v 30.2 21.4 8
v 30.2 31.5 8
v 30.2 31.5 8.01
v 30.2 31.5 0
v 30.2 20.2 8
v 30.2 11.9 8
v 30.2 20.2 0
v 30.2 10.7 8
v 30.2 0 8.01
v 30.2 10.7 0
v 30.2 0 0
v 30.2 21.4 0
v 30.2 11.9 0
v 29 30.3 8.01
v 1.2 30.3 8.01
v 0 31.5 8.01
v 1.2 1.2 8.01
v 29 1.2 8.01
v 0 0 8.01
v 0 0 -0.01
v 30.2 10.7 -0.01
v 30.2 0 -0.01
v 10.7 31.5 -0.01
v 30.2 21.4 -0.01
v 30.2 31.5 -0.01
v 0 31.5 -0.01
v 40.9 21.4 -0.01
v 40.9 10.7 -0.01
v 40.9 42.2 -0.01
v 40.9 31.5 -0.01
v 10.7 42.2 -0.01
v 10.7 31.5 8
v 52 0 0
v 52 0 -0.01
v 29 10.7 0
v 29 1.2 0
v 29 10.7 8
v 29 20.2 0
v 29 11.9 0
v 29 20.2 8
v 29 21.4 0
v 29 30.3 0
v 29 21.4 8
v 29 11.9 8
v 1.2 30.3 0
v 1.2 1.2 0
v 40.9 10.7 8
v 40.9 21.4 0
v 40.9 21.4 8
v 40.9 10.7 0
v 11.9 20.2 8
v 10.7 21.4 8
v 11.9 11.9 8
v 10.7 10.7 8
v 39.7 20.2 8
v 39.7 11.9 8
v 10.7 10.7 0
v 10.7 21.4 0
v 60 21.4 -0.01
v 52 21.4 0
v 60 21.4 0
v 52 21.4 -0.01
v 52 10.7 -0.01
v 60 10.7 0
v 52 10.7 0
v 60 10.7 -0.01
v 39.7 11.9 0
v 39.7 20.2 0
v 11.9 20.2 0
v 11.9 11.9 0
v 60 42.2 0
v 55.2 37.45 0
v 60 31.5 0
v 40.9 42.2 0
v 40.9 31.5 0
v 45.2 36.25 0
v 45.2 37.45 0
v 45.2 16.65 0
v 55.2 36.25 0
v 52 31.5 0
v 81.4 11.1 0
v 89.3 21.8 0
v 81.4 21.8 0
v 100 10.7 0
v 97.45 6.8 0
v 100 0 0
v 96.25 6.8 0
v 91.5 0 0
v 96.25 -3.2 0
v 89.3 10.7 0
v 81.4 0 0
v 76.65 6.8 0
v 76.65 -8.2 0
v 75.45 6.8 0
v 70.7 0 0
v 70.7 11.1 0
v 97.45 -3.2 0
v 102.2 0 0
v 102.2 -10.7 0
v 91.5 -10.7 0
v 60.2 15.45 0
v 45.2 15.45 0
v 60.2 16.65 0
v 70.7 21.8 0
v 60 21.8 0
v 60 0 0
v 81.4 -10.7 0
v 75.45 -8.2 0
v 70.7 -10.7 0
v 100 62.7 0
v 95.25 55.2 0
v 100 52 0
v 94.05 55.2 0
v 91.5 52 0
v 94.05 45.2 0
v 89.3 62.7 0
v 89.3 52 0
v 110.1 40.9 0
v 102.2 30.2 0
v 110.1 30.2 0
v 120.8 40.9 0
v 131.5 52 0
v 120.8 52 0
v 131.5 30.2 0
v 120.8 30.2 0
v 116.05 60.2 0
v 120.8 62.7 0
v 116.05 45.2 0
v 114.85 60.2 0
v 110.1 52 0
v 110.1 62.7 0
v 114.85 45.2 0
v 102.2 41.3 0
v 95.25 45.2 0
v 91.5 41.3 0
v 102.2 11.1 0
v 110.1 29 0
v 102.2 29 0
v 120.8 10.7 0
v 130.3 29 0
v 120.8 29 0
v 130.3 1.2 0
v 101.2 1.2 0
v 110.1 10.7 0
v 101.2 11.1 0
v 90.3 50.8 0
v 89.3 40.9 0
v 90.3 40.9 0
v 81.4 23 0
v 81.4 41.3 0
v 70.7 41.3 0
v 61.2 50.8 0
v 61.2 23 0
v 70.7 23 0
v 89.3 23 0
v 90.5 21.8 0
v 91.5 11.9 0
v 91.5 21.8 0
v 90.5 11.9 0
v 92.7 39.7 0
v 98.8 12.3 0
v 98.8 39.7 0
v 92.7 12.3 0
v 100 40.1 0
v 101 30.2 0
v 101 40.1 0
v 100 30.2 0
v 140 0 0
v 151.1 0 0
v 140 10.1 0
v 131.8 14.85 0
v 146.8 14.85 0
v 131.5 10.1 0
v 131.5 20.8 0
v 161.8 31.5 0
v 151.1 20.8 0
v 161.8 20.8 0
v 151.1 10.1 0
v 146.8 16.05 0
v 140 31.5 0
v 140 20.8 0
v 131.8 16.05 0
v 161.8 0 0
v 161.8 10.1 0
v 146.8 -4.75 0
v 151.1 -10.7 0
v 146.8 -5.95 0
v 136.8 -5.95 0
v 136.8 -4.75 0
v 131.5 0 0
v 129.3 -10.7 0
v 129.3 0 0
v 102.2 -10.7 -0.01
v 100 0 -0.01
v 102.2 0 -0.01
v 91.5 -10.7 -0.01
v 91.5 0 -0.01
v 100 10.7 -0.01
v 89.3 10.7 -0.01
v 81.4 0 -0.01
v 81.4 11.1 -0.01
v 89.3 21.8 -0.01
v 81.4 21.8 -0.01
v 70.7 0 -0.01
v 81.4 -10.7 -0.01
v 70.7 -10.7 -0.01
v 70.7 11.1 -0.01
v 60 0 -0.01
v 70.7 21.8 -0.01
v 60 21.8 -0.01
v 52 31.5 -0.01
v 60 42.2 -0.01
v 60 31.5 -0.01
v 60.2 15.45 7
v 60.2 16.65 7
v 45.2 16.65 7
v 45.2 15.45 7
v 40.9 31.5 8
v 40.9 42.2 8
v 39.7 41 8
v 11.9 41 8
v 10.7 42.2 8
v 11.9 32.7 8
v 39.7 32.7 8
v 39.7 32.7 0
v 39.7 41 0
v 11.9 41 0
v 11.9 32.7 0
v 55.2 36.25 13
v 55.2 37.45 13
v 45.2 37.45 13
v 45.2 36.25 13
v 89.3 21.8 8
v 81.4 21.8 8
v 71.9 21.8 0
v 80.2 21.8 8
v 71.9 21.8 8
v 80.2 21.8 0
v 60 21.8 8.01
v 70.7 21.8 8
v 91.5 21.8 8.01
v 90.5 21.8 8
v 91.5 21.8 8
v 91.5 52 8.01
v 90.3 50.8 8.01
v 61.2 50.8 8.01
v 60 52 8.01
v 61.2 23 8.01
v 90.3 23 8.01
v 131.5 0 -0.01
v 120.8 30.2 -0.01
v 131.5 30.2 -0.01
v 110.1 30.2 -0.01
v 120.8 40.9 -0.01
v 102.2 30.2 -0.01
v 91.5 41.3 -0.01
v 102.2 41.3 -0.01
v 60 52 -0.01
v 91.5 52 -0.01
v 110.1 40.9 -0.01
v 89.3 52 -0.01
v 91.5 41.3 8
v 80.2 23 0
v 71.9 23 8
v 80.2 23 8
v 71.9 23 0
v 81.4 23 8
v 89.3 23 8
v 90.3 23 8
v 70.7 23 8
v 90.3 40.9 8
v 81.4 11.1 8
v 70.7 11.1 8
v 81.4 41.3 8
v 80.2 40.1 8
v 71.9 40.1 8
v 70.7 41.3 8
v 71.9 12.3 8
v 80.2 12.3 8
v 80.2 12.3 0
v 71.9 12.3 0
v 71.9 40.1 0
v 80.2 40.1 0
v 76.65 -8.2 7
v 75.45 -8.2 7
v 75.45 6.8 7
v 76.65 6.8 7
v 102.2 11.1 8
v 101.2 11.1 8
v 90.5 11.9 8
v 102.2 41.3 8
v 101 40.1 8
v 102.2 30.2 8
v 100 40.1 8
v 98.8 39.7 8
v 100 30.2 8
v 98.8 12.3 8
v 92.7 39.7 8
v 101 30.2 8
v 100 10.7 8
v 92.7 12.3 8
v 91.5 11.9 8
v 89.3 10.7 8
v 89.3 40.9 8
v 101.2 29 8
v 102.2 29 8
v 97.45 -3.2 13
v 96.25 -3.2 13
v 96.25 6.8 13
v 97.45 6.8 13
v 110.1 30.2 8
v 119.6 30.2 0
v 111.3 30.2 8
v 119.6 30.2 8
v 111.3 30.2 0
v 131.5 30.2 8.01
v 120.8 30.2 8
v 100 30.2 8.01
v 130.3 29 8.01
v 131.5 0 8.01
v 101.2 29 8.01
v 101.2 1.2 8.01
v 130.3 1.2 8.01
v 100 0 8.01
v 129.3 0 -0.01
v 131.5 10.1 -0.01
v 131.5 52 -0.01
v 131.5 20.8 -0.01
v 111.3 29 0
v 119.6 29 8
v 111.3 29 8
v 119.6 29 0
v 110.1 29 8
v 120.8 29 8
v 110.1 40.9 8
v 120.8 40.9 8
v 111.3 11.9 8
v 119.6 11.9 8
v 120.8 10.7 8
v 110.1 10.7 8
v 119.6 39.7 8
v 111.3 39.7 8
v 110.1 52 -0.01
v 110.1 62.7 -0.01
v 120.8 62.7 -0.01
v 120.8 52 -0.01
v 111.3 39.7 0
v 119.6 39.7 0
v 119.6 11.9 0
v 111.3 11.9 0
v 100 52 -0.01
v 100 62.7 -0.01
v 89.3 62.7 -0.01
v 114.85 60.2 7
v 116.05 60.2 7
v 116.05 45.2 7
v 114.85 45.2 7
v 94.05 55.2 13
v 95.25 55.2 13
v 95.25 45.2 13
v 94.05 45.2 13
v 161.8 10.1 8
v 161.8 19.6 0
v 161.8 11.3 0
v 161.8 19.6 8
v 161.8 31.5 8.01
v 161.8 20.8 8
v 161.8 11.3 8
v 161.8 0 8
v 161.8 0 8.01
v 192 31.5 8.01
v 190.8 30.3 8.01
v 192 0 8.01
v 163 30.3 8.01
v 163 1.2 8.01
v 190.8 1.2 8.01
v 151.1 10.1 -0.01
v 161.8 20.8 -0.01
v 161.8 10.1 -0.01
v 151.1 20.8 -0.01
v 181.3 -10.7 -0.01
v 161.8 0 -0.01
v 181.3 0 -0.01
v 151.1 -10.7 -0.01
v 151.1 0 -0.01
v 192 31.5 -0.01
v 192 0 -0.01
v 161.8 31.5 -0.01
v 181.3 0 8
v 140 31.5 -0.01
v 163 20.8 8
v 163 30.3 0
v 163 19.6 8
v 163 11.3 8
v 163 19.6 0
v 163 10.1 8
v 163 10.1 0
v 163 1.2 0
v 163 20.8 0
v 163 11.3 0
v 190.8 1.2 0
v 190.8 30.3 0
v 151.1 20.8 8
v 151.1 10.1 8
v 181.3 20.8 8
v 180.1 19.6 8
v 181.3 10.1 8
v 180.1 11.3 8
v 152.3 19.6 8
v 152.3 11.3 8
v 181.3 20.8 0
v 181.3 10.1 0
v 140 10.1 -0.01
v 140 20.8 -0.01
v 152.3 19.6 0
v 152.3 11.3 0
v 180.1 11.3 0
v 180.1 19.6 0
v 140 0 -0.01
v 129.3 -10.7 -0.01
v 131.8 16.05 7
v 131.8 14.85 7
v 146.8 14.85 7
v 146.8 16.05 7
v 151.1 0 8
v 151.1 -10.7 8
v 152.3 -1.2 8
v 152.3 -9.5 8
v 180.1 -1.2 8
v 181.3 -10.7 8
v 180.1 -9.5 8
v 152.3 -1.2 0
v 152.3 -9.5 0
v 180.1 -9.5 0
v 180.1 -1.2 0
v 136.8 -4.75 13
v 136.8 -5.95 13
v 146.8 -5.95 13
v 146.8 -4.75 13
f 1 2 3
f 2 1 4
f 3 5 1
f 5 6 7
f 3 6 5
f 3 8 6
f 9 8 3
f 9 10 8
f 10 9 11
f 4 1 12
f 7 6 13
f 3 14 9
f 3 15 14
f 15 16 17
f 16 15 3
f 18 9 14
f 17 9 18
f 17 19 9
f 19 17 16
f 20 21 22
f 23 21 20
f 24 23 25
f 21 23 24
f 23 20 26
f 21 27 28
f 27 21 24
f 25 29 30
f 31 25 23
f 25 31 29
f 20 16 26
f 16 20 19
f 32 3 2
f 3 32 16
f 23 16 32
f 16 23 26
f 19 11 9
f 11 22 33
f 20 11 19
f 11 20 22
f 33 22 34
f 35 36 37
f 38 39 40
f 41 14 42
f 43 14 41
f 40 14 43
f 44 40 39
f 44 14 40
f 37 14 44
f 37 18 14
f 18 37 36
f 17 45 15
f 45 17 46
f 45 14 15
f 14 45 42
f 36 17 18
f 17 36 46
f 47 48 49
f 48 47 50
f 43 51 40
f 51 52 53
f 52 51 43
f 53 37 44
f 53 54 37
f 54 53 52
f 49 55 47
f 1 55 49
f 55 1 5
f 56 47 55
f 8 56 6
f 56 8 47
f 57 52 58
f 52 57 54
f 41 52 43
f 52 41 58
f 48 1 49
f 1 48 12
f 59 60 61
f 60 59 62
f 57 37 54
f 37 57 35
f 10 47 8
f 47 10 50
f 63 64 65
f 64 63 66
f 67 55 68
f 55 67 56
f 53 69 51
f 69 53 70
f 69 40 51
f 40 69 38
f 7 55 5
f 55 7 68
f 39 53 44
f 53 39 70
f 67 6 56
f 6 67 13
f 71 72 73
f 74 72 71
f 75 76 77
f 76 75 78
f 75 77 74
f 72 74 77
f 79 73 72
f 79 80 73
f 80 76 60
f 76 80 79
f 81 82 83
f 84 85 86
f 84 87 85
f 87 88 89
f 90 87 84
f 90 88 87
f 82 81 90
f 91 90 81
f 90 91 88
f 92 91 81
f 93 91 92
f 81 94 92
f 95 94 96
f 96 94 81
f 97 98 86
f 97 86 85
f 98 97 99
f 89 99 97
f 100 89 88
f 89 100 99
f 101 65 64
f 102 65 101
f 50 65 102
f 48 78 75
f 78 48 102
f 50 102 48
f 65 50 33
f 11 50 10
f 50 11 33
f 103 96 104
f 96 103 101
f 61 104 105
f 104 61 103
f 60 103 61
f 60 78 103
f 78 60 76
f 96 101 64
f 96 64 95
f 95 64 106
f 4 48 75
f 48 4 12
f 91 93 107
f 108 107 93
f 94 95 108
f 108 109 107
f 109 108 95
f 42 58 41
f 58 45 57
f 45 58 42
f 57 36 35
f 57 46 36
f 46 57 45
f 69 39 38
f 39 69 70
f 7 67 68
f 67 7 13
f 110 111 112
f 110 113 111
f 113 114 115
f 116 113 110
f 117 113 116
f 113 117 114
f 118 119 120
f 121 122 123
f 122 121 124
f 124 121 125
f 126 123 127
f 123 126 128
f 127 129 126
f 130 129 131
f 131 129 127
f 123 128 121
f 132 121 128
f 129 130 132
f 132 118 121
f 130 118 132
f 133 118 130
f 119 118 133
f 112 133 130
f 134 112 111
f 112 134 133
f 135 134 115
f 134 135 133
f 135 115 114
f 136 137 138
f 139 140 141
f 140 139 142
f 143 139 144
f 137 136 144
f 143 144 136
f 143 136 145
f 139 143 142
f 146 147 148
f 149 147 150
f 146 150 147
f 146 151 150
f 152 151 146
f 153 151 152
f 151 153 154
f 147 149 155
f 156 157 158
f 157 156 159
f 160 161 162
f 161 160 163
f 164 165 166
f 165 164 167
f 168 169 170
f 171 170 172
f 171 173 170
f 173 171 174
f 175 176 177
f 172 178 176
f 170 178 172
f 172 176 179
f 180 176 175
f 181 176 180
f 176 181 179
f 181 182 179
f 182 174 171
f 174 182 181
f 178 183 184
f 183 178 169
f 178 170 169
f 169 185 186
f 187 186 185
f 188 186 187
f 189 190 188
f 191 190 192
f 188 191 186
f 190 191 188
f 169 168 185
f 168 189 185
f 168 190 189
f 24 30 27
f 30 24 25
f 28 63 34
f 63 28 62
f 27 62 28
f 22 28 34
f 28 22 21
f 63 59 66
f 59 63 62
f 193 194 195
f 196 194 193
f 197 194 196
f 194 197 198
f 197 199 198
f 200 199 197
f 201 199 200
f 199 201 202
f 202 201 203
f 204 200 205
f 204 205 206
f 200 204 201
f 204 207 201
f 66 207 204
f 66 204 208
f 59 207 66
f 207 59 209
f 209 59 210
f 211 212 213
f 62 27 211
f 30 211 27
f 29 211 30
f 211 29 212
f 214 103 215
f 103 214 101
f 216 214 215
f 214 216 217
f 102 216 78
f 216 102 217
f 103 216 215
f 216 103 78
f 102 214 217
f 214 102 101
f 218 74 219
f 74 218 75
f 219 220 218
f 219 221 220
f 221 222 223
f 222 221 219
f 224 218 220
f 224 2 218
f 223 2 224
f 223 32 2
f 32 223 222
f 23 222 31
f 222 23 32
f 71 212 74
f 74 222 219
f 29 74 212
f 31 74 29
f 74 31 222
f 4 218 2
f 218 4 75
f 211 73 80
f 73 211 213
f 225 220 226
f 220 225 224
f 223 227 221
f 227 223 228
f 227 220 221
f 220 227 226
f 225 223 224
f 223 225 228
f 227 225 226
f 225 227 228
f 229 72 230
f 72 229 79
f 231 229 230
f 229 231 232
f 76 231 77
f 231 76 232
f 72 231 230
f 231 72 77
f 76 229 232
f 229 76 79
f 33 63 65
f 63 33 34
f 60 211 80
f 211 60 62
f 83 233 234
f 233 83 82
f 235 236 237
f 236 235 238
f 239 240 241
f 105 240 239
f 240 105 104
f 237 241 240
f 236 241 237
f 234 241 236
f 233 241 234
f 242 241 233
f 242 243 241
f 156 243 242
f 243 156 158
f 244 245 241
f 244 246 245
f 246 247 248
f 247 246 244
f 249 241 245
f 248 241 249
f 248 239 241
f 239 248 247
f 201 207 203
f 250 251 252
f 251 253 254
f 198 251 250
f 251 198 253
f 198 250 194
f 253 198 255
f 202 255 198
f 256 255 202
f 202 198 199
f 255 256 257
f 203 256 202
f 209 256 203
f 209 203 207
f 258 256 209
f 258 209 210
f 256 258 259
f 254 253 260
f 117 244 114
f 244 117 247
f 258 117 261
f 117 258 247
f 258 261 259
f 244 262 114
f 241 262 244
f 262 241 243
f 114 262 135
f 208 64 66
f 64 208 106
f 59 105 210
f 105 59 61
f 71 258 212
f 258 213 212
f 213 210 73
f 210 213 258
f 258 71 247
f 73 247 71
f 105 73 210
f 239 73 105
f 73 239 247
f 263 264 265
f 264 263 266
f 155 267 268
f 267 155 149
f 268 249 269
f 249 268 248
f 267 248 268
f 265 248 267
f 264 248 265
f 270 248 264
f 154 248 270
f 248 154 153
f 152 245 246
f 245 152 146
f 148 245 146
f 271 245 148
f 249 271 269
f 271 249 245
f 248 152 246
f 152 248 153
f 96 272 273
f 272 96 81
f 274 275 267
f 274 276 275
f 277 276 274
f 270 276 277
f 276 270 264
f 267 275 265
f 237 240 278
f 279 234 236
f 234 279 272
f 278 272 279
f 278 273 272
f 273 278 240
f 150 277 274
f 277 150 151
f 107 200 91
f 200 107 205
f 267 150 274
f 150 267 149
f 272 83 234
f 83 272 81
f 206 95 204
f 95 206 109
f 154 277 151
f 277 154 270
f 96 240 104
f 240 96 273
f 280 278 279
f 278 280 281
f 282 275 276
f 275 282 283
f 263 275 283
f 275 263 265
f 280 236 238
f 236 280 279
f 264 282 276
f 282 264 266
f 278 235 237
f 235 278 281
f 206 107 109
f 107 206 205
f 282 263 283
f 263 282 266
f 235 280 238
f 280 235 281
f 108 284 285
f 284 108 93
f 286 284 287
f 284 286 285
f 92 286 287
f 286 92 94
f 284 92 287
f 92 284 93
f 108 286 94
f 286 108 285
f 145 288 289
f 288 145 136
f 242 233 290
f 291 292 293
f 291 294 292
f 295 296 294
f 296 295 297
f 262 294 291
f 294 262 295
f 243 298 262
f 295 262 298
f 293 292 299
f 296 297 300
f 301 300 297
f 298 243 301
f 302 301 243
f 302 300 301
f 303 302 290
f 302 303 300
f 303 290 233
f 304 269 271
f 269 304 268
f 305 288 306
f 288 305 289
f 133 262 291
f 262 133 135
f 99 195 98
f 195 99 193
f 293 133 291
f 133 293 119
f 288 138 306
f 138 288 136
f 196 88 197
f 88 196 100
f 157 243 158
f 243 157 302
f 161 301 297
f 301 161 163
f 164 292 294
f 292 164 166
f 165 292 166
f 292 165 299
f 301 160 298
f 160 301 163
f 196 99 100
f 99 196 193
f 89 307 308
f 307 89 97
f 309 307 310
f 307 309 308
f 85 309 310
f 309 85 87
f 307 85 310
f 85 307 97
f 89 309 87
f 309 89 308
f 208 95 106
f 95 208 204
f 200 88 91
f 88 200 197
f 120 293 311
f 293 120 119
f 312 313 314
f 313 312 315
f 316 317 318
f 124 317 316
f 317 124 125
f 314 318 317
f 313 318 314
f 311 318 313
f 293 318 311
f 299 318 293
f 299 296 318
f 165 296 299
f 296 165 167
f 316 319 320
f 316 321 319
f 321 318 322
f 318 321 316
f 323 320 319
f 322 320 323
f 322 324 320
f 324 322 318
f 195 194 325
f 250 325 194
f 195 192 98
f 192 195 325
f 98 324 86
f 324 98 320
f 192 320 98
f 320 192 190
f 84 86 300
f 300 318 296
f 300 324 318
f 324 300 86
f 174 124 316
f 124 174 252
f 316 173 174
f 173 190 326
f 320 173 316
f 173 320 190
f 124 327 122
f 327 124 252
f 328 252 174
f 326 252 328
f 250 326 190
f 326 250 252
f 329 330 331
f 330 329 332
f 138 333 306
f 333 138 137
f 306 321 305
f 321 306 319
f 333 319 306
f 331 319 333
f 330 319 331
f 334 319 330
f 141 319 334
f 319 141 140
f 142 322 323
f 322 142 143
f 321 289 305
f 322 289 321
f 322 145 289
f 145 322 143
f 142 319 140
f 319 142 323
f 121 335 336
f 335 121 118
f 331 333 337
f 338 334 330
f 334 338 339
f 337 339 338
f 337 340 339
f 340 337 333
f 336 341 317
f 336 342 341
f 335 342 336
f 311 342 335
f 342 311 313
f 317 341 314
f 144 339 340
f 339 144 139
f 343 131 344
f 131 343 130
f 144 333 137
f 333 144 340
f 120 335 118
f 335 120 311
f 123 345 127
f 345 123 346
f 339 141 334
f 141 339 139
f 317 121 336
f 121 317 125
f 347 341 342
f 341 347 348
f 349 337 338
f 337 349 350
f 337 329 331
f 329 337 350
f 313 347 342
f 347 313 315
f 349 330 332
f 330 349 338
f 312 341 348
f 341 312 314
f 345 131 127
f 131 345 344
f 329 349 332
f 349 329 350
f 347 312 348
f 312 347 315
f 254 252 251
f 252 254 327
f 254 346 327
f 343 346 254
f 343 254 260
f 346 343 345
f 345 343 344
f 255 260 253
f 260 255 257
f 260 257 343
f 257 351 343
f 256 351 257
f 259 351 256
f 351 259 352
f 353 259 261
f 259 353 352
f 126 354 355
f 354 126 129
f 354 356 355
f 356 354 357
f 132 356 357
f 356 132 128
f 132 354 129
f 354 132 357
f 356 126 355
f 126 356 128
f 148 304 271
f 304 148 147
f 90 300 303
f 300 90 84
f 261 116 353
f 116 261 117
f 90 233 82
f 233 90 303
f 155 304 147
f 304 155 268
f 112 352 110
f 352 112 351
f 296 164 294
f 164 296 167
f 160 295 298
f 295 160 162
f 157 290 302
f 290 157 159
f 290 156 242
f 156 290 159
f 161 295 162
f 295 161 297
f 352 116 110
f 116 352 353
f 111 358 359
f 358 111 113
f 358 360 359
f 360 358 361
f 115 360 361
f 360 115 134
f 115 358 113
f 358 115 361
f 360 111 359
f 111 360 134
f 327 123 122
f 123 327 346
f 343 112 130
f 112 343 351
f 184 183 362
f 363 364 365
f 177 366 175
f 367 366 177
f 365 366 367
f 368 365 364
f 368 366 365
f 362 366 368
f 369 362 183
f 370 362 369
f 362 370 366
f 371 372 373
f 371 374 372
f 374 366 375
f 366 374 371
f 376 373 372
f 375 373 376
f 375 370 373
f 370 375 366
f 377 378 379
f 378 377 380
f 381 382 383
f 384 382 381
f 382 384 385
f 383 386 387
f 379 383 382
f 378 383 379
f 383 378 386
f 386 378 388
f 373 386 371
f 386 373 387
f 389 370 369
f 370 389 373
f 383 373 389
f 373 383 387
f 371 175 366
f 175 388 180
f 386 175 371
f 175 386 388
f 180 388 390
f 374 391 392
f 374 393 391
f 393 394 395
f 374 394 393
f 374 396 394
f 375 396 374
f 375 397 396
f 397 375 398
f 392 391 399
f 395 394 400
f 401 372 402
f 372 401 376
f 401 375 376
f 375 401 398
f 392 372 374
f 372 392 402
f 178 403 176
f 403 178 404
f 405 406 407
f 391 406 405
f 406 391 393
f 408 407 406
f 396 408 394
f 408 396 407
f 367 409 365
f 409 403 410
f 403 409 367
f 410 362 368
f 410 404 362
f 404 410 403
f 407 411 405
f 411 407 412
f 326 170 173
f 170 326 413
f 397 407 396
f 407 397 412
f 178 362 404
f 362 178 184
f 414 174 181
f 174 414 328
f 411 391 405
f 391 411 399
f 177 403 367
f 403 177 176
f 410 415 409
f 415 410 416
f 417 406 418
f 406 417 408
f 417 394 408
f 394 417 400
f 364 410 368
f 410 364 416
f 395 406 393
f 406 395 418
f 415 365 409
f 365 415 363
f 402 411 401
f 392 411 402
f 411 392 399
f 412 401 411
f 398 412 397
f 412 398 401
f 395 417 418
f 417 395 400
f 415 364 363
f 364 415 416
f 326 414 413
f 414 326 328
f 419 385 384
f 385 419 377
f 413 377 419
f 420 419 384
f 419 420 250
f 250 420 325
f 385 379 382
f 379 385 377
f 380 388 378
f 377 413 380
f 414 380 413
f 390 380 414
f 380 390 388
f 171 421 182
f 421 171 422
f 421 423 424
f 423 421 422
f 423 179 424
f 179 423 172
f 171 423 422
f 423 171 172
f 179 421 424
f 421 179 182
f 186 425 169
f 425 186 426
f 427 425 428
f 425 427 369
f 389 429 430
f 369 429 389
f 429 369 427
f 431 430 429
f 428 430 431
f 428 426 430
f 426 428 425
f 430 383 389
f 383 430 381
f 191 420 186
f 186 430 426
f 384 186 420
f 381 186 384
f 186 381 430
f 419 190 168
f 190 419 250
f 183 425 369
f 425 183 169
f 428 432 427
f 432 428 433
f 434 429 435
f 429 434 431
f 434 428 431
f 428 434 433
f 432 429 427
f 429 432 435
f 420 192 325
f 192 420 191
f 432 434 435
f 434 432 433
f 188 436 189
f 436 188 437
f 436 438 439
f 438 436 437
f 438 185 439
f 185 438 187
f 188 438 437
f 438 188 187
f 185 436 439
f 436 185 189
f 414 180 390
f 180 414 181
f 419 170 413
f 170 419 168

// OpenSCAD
// file: ../../Elements/FrameBracketWithoutWorm.scad
// Fischertechnik Box Library
// Frame  for bracket without worm
// 31046

use <../Base/Constants.scad>
use <../ModelBase/Complex.scad>

// getFrameBracketWithoutWormSpace()
// Gets the space for a frame for a bracket with worm.

function getFrameBracketWithoutWormSpace() = getFrameBracketSpace();

// FrameBracketWithoutWorm()
// Frame for bracket with worm.

module FrameBracketWithoutWorm() {
    FrameBracket([ 10, getDividerThickness(), 13 ]);
}

// Test
color("lightgray")
FrameBracketWithoutWorm();
// file: ../../Elements/FrameBracketWithWorm.scad
// Fischertechnik Box Library
// Frame  for bracket with worm
// 31045

use <../Base/Constants.scad>
use <../ModelBase/Complex.scad>

// getFrameBracketWithWormSpace()
// Gets the space for a frame for a bracket with worm.

function getFrameBracketWithWormSpace() = getFrameBracketSpace();

// FrameBracketWithWorm()
// Frame for bracket with worm.

module FrameBracketWithWorm() {
    FrameBracket([ 15, getDividerThickness(), 7 ]);
}

// Test
color("lightgray")
FrameBracketWithWorm();
// file: ../../Base/Boxes.scad
// Fischertechnik Box Foundation
// Pre-designed Boxes

use <Constants.scad>

include <PlacementOptions.scad>

box190Width = 190;
box190Depth = 130;
box130Width = 130;
box130Depth = 95;
boxUsageHeight = 33.9;
boxWallThickness = 2.4;
boxBaseThickness = 1.0;
boxWebWidth = 3.0;

// getBoxWallThickness()
// Gets the wall thickness of a Fischertechnik Box

function getBoxWallThickness() = boxWallThickness;

// Gets the usable height of a fischertechnik box
function getBoxUsageHeight() = boxUsageHeight;

// Gets the thickness of the Fischertechnik box base.
function getBoxBaseThickness() = boxBaseThickness;

// Gets the width of a box web
function getBoxWebWidth() = boxWebWidth;

// Gets the usable inner space of a Box 190 as an x/y-list
function getBox190Space() = [
    box190Width - 2*getBoxWallThickness(), 
    box190Depth - 2*getBoxWallThickness() ];

// Imports the Fischertechnik empty box 130x190 mm and places it at position 0,0
// 190x130 are the outer sizes, the inner space is slightly smaller. Use getBox190Space() to get the inner sizes.
// This module needs the STL file "Fischertechnik Box 130x190.stl" in the library path.
// The box is positioned that the usable inner space is at the 0,0,0 position. The

module Box190() {
    translate([-getBoxWallThickness(),-getBoxWallThickness(),-getBoxBaseThickness()])
        import("Fischertechnik Box 130x190.stl", convexity=3);
}

// Gets the usable inner space of a Box 130 as an x/y-list
function getBox130Space() = [
    box130Width - 2*getBoxWallThickness(), 
    box130Depth - 2*getBoxWallThickness() ];

// Imports the Fischertechnik empty box 95x130 mm and places it at position 0,0
// 190x130 are the outer sizes, the inner space is slightly smaller. Use getBox190Space() to get the inner sizes.
// This module needs the STL file "Fischertechnik Box 95x130.stl" in the library path.
// The box is positioned that the usable inner space is at the 0,0,0 position. The

module Box130() {
    translate([-getBoxWallThickness(),-getBoxWallThickness(),-getBoxBaseThickness()])
        import("Fischertechnik Box 95x130.stl", convexity=3);
}

// Creates a web at the specified box walls
// corner 0 = LowerLeft, 1 = UpperLeft, 2 = UpperRight, 3 = LowerRight
// side 0 = LeftOfCorner, 1 = RightOfCorner
// distance = Distance in mm from the corner
// box = inner width and depth of the box (default: Box 190)
// webWidth = length of the web (default is 3 mms)
// webThickness = thickness of the web (default is 1 mm)

module BoxWeb(corner, side, distance, box=getBox190Space(), webWidth=getBoxWebWidth(), webThickness=1.0) {
    sink = getBoxWallThickness()/2;

    width = (corner % 2 == 0) ? 
            (side == LeftOfCorner ? webWidth : webThickness) :
            (side == LeftOfCorner ? webThickness : webWidth);

    depth = (corner % 2 == 0) ? 
            (side == RightOfCorner ? webWidth : webThickness) :
            (side == RightOfCorner ? webThickness : webWidth);
    
    xDiff = corner == LowerLeft ? 
                (side == LeftOfCorner ? -sink : distance) :
            (corner == UpperLeft ?                
                (side == LeftOfCorner ? distance : -sink) :
            (corner == UpperRight ?
                (side == LeftOfCorner ? box.x-webWidth+sink : box.x-distance-webThickness) :
                (side == LeftOfCorner ? box.x-distance-webThickness: box.x-webWidth+sink)));

    yDiff = corner == LowerLeft ? 
                (side == RightOfCorner ? -sink : distance) :
            (corner == UpperLeft ?
                (side == RightOfCorner ? box.y-distance : box.y-webWidth+sink) :
            (corner == UpperRight ?
                (side == RightOfCorner ? box.y-webWidth+sink : box.y-distance) :
                (side == RightOfCorner ? distance : -sink)));
    
    translate([xDiff, yDiff, -getExcess()])
        cube([width, depth, boxUsageHeight + 2*getExcess()]);
}
// file: ../../Base/Rotation.scad
// Fischertechnik Box Foundation
// Geometry Helpers Rotation

include <PlacementOptions.scad>

// getRotatedSpace(space, rotation=NoRotation)
// Rotates the space dependent on the specified rotation

function getRotatedSpace(space, rotation=NoRotation) = [
    (rotation == Rotate90 || rotation == Rotate270) ? space.y : space.x,
    (rotation == Rotate90 || rotation == Rotate270) ? space.x : space.y
];

// Rotates the given space around the fixed left lower corner
// space = the space the children needs as width/depth list [width,depth]
// rotation = 0 Rotate0 degrees, 1 Rotate90 degrees, 2 Rotate180 degrees, 3 Rotate270 degrees (equivalent to -90)

module RotateFix(space, rotation=NoRotation) {
    dy = (rotation == Rotate0 || rotation == Rotate270) ? 0 :
        (rotation == Rotate90) ? space.x :
        space.y;
    dx = (rotation < Rotate180) ? 0 :
        (rotation == Rotate180) ? space.x :
        space.y;
    
    translate([dx, dy, 0])
        rotate([0, 0, rotations[rotation]])
            children();
}
// file: ../../Base/Alignment.scad
// Fischertechnik Box Foundation
// Geometry Helpers Alignment

include <PlacementOptions.scad>

// getAlignedX(elementWidth, spaceWidth, align=AlignRight, offset=0)
// Gets the aligned X offset of an element with the given
// width in the given space.
// elementWidth = The width of the element to positon
// spaceWidth = The space where the element should be aligned
// align = 0 AlignLeft, 1 AlignCenter, 2 AlignRight
// offset = an optional offset from the aligned position. When
// aligned left or centered, then positive values are in X direction.
// When aligned right then positive values are in negative X direction.

function getAlignedX(elementWidth, spaceWidth, align=AlignRight, offset=0) =
    (align == AlignLeft) ?
        offset :
        ((align == AlignCenter) ?
        (spaceWidth - elementWidth)/2 + offset :
        spaceWidth - offset - elementWidth);

// getAlignedY(elementDepth, spaceDepth, align=AlignTop, offset=0)
// Gets the aligned Y offset of an element with the given
// depth in the given space.
// elementDepth = The depth of the element to positon
// spaceDepth = The space where the element should be aligned
// align = 0 AlignBottom, 1 AlignCenter, 2 AlignTop
// offset = an optional offset from the aligned position. When
// aligned bottom or centered, then positive values are in Y direction.
// When aligned top then positive values are in negative Y direction.

function getAlignedY(elementDepth, spaceDepth, align=AlignTop, offset=0) =
    (align == AlignBottom) ?
        offset :
        ((align == AlignCenter) ?
        (spaceDepth - elementDepth)/2 + offset :
        spaceDepth - offset - elementDepth);
// file: ../../Base/Constants.scad
// Fischertechnik Box Foundation
// Constants

// Constant values necessary for multiple elements

// Base constants
dividerThickness = 1.2;
excess = 0.01;
fragments = 90;
tolerance = 0.8;

// Gets the thickness of a divider 
function getDividerThickness() = dividerThickness;

// Gets the excess that is used to merge walls into each other
function getExcess() = excess;

// Gets amount of fragments of a cylinder
function getFragments() = fragments;

// Gets the inner tolerance of a frame to each side
function getTolerance() = tolerance;


// Fischertechnik specific constants
axisDiameter = 4;
axisBottomDiameter = axisDiameter + 1;
axisTolerance = 0.2;
axisLockingLength = 8;

// Gets axis diameter of Fischertechnik axis
function getAxisDiameter() = axisDiameter;

// Gets axis diameter tolerance (subtracted for element axis)
function getAxisTolerance() = axisTolerance;

// Gets the axis diameter for standing axis
function getStandAxisDiameter() = getAxisDiameter() - getAxisTolerance();

// Gets axis bottom diameter for thicker part at the bottom
function getAxisBottomDiameter() = axisBottomDiameter;

// Gets the lengthh of the locking part of a locking axis
function getAxisLockingLength() = axisLockingLength;

// Studs

studHeight = 2.5;
studTolerance = 0.2;
studRailDistance = 9;   // as in ft 50

// gets the height of a connecting stud
function getStudHeight() = studHeight;

// gets the connecting stud height tolerance
function getStudTolerance() = studTolerance;

// gets the default rail distance for studs
function getStudRailDistance() = studRailDistance;

// Dockable Frame with Edge

standardEdgeDistance = 2.5;
standardWebDistance = 11.5;
standardCornerLength = 15;

// gets the standard distance to the wall of the box for dockable frames with webs
function getStandardEdgeDistance() = standardEdgeDistance;

// gets the standard distance of each web to the corner of the dockable frame
function getStandardWebDistance() = standardWebDistance;

// gets the standard length of the corner walls of a dockable frame
function getStandardCornerLength() = standardCornerLength;

// Tubes

tubeWallFactor = 0.8;

// gets the wall thickness of a tube.
function getTubeWallThickness() = tubeWallFactor * getDividerThickness();

// Small Parts and Divider Frame

smallPartsFrameHeight = 20;

// gets the frame height for docked small parts boxes.
function getSmallPartsFrameHeight() = smallPartsFrameHeight;

// Hubs

hubRingDiameter = 19.5;
hubRingLevelDiameter = 21;

// gets the diameter of a tube matching the inner ring of a wheel
function getHubRingDiameter() = hubRingDiameter;

// gets the diameter of a hub tube with a thicker diameter
function getHubRingLevelDiameter() = hubRingLevelDiameter;

// Struts

strutAddLength = 9.0;
strutDepth = 8.0;
strutThickness = 2.8;
strutOuterTolerance = 0.6;

// gets the full length of a strut (nominal length plus 2x radius at the ends)
function getFullStrutLength(length) = length + strutAddLength;

// gets the radius of the end of a strut
function getStrutEndRadius() = strutAddLength / 2;

// gets the the depth (width) of a strut
function getStrutDepth() = strutDepth;

// gets the the thickness of a strut
function getStrutThickness() = strutThickness;

// gets the tolerance added to the strut sizes for strut holders
function getStrutOuterTolerance() = strutOuterTolerance;

// Propeller

propellerAxisDiameter = 7.0;
propellerAxisTolerance = 0.2;

// gets the propeller axis outer diameter
function getPropellerAxisDiameter() = propellerAxisDiameter;

// gets the propeller axis printing tolerance
function getPropellerAxisTolerance() = propellerAxisTolerance;
// file: ../../Base/PlacementOptions.scad
// Fischertechnik Box Foundation
// Placement Options

// Alignment
NoAlign = 0;
AlignLeft = 1;
AlignBottom = 2;
AlignCenter = 3;
AlignRight = 4;
AlignTop = 5;

// Element rotation degree steps
rotations = [0, -90, -180, -270];

// Rotation
NoRotation = 0;
Rotate0 = 0;
Rotate90 = 1;
Rotate180 = 2;
Rotate270 = 3;

// Docking (seen from above)
NoDock = -1;
DockLeft = 0;
DockTop = 1;
DockRight = 2;
DockCorner = 2;
DockBottom = 3;

// Web corners
LowerLeft = 0;
UpperLeft = 1;
UpperRight = 2;
LowerRight = 3;

// Web position relative to corner
LeftOfCorner = 0;
RightOfCorner = 1;
// file: ../../Elements/FrameBracketCombo.scad
// Fischertechnik Box Library
// Frames for brackets with and without worm
// 31045 + 31046

use <../Base/Constants.scad>
use <../Base/Deployment.scad>
use <../ModelBase/Simple.scad>
use <../ModelBase/Complex.scad>
use <FrameBracketWithWorm.scad>
use <FrameBracketWithoutWorm.scad>

include <../Base/PlacementOptions.scad>

outerDepth = 31.5;

// getFrameBracketComboSpace()
// Gets the space for a frame for a combination of brackets with worm and without worm.

function getFrameBracketComboSpace() = [getFrameBracketSpace().x, outerDepth];

// FrameBracketCombo()
// Frame for a combination of brackets with worm and without worm.

module FrameBracketCombo() {
    Space(getFrameBracketComboSpace());
    Frame([getFrameBracketWidth(), outerDepth - 2*getDividerThickness() - getTolerance(), getFrameBracketSpace().z]);
    DeployVertical(outerDepth, [getFrameBracketWithWormSpace(), getFrameBracketWithoutWormSpace()]) {
        FrameBracketWithWorm();
        FrameBracketWithoutWorm();
    }
}

// Test
color("lightgray")
FrameBracketCombo();
// file: ../../Base/Placement.scad
// Fischertechnik Box Foundation
// Geometry Helpers Placement

use <Constants.scad>
use <Alignment.scad>
use <Rotation.scad>
use <Boxes.scad>

include <PlacementOptions.scad>

// Place(x=0, y=0, elementSpace=[0,0], alignX=AlignLeft, alignY=AlignBottom, rotation=Rotate0, boxSpace=getBox190Space())
// Places the child at the specified position
// y = Y-Position. This is a relative position when an X aligment is specified.
// x = X-Position. This is a relative position when an Y aligment is specified.
// elementSpace = space of the element to be placed [x,y]
// alignX = -1=NoAlign, 0 AlignLeft, 1 AlignCenter, 3 AlignRight (elementSpace and boxSpace required!)
// alignY = -1=NoAlign, 2 AlignBottom, 1 AlignCenter, 4 AlignTop (elementSpace and boxSpace required!)
// rotation = 0 Rotate0 0 degrees, 1 Rotate90 90 degrees, 
// 2 Rotate180 180 degrees, 3 Rotate270 270 degrees (equivalent to -90)
// boxSpace = Inner space of the box where the placement occurs [x,y] - default is Box 190x130 inner space

module Place(x=0, y=0, elementSpace=[0,0], 
  alignX=AlignLeft, alignY=AlignBottom, 
  rotation=NoRotation, boxSpace=getBox190Space()) {

    module Position(x, y, space, rotation=Rotate0) {
        translate([x, y, 0])
            RotateFix(space, rotation)
                children();
    }

    space = getRotatedSpace(elementSpace, rotation);
    alignedX = getAlignedX(space.x, boxSpace.x, alignX, x);
    alignedY = getAlignedY(space.y, boxSpace.y, alignY, y);
    Position(alignedX, alignedY, elementSpace, rotation)
        children();
}

// Center(space=getBox130Space(), elementSpace=[0,0])
// space = Space where the children is centered. For cylinder use centered=true and no elementSpace.
// elementSpace = space of the element to be centered [x,y]

module Center(space=getBox190Space(), elementSpace=[0,0]) {
    translate([(space.x - elementSpace.x) / 2, (space.y - elementSpace.y) / 2])
        children(0);
}

// CenterHorizontal(width=0, y=0, offset=0, space=getBox130Space())
// space = Space where the children is centered. For cylinder use centered=true and no elementSpace.
// elementSpace = space of the element to be centered [x,y]

module CenterHorizontal(width=0, y=0, offset=0, space=getBox190Space()) {
    translate([(space.x - width) / 2 + offset, y])
        children(0);
}

// CenterVertical(depth=0, x=0, offset=0, space=getBox130Space())
// space = Space where the children is centered. For cylinder use centered=true and no elementSpace.
// elementSpace = space of the element to be centered [x,y]

module CenterVertical(depth=0, x=0, offset=0, space=getBox190Space()) {
    translate([x, (space.y - depth) / 2 + offset])
        children(0);
}
// main file
// Fischertechnik Box Foundation
// Elements
// Test FrameBracketCombo

use <../../Base/Placement.scad>
use <../../Elements/FrameBracketCombo.scad>

include <../../Base/PlacementOptions.scad>

FrameBracketCombo();

Place(60, 0, getFrameBracketComboSpace(), rotation=Rotate90)
    FrameBracketCombo();

Place(100, 0, getFrameBracketComboSpace(), rotation=Rotate270)
    FrameBracketCombo();

Place(140, 0, getFrameBracketComboSpace(), rotation=Rotate180)
    FrameBracketCombo();
